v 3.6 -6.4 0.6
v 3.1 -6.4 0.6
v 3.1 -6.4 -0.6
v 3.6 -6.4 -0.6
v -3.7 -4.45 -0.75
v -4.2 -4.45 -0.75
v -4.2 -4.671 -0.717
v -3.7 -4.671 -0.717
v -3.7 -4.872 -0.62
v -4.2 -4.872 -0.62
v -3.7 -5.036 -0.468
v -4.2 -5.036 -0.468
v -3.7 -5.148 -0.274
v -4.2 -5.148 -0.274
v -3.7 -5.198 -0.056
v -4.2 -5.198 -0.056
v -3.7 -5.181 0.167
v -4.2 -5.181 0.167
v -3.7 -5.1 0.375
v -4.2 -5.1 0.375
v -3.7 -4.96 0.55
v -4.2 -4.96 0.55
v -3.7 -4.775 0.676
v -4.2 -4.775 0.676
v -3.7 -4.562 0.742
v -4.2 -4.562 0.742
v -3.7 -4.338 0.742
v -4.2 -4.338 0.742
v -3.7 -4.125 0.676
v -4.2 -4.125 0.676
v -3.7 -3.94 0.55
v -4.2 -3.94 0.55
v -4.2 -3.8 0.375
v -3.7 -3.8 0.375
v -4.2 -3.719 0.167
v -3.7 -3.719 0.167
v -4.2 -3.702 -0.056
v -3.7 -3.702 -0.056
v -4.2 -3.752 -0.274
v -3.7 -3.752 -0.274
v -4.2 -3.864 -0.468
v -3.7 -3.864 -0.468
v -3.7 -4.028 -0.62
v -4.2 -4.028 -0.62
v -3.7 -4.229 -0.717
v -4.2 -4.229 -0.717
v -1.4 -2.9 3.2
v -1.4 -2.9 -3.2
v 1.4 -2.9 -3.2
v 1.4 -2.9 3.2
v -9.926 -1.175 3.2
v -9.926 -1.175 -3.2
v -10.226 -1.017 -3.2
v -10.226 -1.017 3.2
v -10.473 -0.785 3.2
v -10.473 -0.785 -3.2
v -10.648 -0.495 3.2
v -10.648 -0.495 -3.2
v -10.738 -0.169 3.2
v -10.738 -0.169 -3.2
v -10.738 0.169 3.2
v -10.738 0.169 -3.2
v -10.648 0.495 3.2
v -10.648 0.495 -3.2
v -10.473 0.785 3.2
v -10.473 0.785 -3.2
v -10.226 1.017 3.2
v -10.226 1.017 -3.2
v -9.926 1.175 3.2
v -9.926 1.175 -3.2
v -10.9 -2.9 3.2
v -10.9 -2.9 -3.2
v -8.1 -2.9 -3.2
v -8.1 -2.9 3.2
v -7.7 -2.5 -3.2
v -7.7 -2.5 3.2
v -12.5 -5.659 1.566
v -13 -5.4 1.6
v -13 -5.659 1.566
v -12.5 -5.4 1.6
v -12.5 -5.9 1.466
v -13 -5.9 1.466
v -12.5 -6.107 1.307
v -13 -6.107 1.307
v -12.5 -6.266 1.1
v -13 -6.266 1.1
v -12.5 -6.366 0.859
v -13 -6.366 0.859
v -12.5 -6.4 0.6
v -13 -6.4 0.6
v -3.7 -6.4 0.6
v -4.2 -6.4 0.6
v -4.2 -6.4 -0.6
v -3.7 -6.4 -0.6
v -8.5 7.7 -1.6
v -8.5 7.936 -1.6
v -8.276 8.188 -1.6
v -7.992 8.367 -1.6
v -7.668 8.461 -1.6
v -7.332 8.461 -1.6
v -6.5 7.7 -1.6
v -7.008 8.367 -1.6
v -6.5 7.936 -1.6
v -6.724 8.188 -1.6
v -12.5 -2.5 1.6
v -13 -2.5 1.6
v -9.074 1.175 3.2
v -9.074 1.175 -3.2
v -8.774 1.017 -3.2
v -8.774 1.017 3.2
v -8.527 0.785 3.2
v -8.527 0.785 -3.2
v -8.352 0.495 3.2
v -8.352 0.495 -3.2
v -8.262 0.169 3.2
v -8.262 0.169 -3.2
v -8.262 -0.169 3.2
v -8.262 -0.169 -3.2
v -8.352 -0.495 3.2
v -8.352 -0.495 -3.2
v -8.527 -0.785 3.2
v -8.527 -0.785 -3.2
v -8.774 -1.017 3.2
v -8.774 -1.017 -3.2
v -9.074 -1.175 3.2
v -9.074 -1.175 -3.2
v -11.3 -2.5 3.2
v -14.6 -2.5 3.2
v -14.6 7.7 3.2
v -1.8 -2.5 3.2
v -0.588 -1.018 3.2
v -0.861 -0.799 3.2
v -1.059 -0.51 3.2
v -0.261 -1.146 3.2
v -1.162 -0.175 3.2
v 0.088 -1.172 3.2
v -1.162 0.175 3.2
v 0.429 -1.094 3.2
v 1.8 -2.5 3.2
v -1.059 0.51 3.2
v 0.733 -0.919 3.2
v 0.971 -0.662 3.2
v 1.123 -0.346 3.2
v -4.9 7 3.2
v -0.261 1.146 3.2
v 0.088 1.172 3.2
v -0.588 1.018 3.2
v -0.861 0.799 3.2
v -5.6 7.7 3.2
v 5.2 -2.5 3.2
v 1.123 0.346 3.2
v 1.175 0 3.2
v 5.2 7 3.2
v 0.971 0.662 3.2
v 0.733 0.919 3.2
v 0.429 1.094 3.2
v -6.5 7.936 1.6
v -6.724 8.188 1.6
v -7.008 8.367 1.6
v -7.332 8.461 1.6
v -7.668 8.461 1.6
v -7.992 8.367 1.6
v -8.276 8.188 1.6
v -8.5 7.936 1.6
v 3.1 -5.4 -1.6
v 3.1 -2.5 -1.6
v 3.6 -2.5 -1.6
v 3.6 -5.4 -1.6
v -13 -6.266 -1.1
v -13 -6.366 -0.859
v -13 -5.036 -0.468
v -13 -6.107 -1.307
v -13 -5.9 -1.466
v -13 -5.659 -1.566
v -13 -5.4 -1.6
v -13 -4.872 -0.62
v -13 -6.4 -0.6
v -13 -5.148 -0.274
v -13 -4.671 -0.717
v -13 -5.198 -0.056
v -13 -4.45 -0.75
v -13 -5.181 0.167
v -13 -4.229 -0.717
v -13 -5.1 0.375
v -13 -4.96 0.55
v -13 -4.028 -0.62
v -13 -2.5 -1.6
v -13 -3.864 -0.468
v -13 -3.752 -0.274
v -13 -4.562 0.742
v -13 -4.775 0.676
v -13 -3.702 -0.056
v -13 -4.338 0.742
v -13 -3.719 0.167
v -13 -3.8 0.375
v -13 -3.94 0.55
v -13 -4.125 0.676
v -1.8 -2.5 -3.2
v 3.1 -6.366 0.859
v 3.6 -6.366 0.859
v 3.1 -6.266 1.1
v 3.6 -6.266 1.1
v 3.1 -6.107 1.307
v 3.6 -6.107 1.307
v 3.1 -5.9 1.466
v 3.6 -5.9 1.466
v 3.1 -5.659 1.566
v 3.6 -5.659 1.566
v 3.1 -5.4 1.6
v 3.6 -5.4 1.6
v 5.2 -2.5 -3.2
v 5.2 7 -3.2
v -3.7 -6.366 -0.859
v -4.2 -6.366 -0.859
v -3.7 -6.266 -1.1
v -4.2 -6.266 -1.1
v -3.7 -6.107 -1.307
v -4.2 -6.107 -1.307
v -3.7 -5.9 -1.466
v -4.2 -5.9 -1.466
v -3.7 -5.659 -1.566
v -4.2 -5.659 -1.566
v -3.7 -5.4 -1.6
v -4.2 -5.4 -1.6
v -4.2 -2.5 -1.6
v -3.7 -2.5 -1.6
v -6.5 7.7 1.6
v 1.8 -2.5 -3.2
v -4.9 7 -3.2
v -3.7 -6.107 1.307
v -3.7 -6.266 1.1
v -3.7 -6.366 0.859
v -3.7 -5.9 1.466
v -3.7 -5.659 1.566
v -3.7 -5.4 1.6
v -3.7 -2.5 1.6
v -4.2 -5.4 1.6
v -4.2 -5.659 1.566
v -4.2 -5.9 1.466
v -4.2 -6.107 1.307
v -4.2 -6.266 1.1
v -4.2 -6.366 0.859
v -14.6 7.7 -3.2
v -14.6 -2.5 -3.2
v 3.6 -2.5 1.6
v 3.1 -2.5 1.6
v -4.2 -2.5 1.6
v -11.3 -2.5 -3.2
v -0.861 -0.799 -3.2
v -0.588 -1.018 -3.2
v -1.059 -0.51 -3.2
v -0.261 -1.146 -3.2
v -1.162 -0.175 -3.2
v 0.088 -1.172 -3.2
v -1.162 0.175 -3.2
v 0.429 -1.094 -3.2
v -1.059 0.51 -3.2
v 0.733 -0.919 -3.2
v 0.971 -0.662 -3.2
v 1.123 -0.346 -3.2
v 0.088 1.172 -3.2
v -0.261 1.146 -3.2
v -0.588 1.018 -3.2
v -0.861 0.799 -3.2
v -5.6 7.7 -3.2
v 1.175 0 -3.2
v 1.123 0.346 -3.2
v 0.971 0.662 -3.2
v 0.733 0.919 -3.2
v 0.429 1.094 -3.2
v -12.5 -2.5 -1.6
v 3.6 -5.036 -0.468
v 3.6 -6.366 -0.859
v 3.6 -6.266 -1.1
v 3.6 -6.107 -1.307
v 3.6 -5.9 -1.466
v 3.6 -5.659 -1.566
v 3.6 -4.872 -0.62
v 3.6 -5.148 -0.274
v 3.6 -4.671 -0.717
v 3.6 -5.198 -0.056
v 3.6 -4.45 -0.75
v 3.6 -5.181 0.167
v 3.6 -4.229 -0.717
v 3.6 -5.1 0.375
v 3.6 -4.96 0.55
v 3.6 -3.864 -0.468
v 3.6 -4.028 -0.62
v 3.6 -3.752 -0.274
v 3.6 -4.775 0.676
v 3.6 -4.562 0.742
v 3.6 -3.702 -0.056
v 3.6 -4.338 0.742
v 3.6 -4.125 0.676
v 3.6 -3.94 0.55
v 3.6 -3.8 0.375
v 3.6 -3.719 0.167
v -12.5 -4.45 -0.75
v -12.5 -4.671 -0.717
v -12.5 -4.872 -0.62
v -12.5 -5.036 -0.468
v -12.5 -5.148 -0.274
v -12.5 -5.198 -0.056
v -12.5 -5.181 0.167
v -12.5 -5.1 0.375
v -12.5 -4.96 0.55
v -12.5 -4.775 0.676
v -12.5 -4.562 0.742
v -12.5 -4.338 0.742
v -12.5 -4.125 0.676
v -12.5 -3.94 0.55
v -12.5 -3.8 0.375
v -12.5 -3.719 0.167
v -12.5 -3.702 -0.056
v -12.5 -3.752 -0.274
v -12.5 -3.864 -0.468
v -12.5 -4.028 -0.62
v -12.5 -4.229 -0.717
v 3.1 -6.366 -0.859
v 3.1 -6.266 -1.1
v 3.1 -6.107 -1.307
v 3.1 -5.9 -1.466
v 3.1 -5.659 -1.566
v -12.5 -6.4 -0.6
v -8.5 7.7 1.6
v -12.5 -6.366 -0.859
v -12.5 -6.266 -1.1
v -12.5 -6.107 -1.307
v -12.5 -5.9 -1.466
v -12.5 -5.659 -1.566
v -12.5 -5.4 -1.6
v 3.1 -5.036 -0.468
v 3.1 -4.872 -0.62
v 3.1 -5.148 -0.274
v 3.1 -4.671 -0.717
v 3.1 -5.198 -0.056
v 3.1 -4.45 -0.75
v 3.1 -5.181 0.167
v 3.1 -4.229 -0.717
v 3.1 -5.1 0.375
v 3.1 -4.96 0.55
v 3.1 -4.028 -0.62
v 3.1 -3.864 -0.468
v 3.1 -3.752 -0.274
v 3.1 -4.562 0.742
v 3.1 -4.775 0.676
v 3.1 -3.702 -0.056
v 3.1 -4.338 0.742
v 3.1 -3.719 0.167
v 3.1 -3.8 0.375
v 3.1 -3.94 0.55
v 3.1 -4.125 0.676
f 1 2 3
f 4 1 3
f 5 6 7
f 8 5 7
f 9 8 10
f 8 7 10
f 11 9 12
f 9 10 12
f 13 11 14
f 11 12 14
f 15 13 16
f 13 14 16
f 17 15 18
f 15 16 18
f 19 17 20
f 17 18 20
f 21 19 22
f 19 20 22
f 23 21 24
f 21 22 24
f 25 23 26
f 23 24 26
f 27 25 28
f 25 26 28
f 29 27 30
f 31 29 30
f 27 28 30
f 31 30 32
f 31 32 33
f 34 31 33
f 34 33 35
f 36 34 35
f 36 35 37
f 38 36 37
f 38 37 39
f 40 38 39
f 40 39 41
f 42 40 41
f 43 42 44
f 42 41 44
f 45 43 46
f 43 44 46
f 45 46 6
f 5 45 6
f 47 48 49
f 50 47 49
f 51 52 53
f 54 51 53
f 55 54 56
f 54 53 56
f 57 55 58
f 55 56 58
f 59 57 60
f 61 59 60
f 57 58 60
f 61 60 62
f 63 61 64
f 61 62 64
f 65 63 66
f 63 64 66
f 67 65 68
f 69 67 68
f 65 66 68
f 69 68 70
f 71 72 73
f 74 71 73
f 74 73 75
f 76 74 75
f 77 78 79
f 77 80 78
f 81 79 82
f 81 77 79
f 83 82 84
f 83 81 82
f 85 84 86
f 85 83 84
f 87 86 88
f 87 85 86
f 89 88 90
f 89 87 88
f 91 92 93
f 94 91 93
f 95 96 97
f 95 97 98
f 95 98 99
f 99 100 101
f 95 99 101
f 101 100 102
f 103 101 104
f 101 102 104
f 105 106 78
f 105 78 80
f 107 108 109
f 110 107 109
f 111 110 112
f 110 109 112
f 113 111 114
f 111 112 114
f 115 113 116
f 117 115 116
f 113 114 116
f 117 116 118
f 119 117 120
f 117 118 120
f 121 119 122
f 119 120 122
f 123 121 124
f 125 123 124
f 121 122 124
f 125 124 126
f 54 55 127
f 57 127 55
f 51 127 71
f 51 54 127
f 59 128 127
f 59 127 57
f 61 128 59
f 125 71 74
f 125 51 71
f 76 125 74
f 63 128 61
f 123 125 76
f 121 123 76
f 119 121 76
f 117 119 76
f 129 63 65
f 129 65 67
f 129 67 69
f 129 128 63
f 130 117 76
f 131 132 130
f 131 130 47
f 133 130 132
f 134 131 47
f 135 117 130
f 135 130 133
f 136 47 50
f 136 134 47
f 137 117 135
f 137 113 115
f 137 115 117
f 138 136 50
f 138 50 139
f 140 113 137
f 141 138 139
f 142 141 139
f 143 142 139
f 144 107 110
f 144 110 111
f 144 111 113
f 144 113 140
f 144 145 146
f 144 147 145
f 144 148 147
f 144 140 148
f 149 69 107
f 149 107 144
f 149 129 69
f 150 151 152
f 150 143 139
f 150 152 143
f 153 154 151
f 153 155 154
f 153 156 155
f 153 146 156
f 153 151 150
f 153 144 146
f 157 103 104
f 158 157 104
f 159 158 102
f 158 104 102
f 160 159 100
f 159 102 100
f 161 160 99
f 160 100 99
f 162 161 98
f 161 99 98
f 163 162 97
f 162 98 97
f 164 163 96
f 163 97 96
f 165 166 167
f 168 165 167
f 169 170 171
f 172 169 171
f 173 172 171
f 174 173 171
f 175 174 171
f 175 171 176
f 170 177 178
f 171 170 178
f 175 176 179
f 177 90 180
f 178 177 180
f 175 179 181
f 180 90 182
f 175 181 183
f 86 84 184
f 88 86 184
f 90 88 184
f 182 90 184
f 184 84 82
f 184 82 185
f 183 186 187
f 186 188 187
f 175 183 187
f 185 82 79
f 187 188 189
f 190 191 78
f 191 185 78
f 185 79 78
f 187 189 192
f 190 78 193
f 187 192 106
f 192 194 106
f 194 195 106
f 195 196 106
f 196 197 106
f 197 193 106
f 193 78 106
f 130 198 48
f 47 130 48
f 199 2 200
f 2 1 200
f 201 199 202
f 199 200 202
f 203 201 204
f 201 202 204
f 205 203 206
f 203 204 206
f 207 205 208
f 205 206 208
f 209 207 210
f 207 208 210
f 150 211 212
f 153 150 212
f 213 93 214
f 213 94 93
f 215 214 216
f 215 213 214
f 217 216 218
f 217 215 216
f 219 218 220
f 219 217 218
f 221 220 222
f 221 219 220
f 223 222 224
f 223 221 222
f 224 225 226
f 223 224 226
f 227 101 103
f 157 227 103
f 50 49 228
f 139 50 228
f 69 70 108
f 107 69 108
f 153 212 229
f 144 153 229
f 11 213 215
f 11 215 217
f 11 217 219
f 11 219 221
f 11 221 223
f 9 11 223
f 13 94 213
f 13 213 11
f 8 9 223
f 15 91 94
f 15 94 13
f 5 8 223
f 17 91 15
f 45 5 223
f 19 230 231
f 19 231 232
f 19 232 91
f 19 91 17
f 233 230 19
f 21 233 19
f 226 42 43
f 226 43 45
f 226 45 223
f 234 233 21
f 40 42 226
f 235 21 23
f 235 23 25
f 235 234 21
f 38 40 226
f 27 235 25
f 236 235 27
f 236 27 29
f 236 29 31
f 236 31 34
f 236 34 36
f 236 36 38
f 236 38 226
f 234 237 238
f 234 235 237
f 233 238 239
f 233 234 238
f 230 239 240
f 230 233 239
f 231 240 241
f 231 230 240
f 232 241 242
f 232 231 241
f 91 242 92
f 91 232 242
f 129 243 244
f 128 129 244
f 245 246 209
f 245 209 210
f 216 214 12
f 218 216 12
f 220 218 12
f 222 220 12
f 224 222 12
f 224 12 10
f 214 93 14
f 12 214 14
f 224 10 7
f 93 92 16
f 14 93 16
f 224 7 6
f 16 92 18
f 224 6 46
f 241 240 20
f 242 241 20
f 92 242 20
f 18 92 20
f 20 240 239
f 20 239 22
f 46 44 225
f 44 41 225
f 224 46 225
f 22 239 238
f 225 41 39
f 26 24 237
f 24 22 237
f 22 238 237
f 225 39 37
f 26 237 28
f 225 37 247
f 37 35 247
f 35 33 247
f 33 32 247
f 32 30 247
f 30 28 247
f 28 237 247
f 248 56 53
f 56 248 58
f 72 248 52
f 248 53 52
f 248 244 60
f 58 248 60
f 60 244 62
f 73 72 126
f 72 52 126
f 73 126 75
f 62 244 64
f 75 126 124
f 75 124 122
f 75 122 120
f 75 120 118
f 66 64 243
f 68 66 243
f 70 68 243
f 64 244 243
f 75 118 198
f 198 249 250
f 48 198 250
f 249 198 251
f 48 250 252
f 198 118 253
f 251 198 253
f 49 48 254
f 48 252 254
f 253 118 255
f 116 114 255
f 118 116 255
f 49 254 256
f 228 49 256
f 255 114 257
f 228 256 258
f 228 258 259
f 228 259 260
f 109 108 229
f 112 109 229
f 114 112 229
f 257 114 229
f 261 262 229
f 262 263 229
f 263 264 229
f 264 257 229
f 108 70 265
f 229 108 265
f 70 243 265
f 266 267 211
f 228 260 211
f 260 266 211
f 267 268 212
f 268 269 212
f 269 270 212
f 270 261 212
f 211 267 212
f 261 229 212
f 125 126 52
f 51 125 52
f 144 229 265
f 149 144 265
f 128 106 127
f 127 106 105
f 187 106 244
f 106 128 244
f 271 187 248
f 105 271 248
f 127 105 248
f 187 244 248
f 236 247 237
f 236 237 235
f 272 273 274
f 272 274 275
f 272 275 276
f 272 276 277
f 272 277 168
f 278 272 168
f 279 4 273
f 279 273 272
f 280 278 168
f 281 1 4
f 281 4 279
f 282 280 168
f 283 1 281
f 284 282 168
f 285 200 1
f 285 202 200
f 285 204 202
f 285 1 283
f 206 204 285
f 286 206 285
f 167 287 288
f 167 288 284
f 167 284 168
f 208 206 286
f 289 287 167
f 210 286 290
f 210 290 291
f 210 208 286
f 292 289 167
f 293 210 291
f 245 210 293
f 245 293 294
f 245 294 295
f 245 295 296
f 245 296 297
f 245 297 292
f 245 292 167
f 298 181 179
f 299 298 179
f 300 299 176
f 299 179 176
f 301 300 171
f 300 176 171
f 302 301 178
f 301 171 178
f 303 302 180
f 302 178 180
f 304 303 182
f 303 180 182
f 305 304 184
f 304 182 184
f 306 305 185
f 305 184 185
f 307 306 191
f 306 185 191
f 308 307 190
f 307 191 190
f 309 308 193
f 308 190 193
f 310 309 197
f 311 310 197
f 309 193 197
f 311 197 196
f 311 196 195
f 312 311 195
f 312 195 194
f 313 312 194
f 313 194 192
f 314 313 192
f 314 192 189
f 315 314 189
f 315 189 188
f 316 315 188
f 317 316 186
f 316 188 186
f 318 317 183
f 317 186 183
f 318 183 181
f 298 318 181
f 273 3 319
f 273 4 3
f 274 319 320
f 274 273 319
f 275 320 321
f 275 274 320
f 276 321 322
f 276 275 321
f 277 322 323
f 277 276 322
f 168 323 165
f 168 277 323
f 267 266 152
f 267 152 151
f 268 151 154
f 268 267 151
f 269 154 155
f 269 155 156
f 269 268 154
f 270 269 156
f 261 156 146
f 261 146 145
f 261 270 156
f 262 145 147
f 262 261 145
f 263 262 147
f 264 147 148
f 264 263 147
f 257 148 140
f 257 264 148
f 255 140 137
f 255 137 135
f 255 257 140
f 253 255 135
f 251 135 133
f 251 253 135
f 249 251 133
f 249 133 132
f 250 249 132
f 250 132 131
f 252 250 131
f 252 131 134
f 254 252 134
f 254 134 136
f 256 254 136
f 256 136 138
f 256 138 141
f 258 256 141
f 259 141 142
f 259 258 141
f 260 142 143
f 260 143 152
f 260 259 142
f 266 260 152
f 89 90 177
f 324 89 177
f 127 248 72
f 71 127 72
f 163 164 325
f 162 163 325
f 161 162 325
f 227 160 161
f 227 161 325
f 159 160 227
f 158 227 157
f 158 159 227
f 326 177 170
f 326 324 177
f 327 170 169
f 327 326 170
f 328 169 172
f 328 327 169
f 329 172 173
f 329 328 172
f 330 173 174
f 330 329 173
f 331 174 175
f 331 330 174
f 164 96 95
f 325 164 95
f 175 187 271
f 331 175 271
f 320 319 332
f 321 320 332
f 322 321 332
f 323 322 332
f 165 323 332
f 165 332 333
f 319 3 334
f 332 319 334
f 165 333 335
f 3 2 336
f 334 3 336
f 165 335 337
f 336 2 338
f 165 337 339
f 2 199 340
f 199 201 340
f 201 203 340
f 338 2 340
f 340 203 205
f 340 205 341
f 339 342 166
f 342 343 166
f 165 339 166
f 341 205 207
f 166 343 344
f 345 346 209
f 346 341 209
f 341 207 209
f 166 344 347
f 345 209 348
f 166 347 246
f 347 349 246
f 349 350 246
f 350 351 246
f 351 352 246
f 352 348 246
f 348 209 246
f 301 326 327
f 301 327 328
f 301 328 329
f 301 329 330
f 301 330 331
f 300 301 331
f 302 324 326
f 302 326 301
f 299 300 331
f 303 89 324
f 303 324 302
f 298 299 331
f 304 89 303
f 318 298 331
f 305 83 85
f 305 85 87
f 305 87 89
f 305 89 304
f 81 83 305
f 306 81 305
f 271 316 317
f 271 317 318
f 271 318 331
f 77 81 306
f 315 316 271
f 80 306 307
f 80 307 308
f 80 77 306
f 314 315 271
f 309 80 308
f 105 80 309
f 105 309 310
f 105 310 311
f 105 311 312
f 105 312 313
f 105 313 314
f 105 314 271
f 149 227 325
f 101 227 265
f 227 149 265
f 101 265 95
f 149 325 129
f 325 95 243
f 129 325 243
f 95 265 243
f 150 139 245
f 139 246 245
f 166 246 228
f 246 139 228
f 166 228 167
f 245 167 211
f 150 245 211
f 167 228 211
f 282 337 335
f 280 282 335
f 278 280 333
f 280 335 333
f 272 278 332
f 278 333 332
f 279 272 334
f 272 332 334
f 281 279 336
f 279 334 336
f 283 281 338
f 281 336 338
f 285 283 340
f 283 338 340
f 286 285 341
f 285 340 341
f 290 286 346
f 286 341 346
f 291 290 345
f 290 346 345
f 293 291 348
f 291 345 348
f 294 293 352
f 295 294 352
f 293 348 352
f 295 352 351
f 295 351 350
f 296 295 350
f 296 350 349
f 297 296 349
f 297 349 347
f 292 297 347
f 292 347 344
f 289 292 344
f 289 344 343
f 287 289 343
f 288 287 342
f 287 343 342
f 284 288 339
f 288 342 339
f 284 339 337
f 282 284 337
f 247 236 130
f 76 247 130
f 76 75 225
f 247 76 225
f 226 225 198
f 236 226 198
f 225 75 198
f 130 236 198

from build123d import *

# Parameters (mm, degrees)
CUT_EXTRUDE1_START       = -3.2
CUT_EXTRUDE1_OUTLINE_R   = 1.175
CUT_EXTRUDE1_DEPTH       = 6.4
CUT_EXTRUDE1_START_2     = -1.6
CUT_EXTRUDE1_2_OUTLINE_W = 0.5
CUT_EXTRUDE1_2_OUTLINE_H = 3.9
CUT_EXTRUDE1_2_DEPTH     = 0.8499999
CUT_EXTRUDE1_START_3     = 0.7500001
CUT_EXTRUDE1_3_OUTLINE_W = 0.5
CUT_EXTRUDE1_3_OUTLINE_H = 3.9
CUT_EXTRUDE1_3_DEPTH     = 0.8499999
CUT_EXTRUDE1_4_DEPTH     = 3.2
CUT_EXTRUDE1_START_4     = -13
CUT_EXTRUDE1_5_DEPTH     = 0.5
CUT_EXTRUDE1_START_5     = -4.2
CUT_EXTRUDE1_6_DEPTH     = 0.5
CUT_EXTRUDE1_START_6     = 3.1
CUT_EXTRUDE1_7_DEPTH     = 0.5
FILLET1_R                = 1


with BuildPart() as part:
    # Cut-Extrude1: read off the stored shape, not the designer's step
    # Cut-Extrude1 outline → Cut-Extrude1 (new body)
    with BuildSketch(Plane.XY.offset(CUT_EXTRUDE1_START)):
        Polygon((-14.6, -2.5), (-11.3, -2.5), (-10.9, -2.9), (-8.1, -2.9), (-7.7, -2.5), (-1.8, -2.5), (-1.4, -2.9), (1.4, -2.9), (1.8, -2.5), (5.2, -2.5), (5.2, 7), (-4.9, 7), (-5.6, 7.7), (-14.6, 7.7), align=None)
        with BuildLine():
            ThreePointArc((-9.926468053, -1.175), (-10.75, 0), (-9.926468053, 1.175))
            Line((-9.926468053, 1.175), (-9.073531947, 1.175))
            ThreePointArc((-9.073531947, 1.175), (-8.25, 0), (-9.073531947, -1.175))
            Line((-9.073531947, -1.175), (-9.926468053, -1.175))
        make_face(mode=Mode.SUBTRACT)
        Circle(CUT_EXTRUDE1_OUTLINE_R, mode=Mode.SUBTRACT)
    extrude(amount=CUT_EXTRUDE1_DEPTH)

    # Cut-Extrude1 2 outline → Cut-Extrude1 2 (add)
    with BuildSketch(Plane.XY.offset(CUT_EXTRUDE1_START_2)):
        with Locations((-12.75, -4.45)):
            Rectangle(CUT_EXTRUDE1_2_OUTLINE_W, CUT_EXTRUDE1_2_OUTLINE_H)
        with Locations((-3.95, -4.45)):
            Rectangle(CUT_EXTRUDE1_2_OUTLINE_W, CUT_EXTRUDE1_2_OUTLINE_H)
        with BuildLine():
            Line((-8.5, 7.936178156), (-8.5, 7.7))
            Line((-8.5, 7.7), (-6.5, 7.7))
            Line((-6.5, 7.7), (-6.5, 7.936178156))
            ThreePointArc((-6.5, 7.936178156), (-7.5, 8.472853198), (-8.5, 7.936178156))
        make_face()
        with Locations((3.35, -4.45)):
            Rectangle(CUT_EXTRUDE1_2_OUTLINE_W, CUT_EXTRUDE1_2_OUTLINE_H)
    extrude(amount=CUT_EXTRUDE1_2_DEPTH)

    # Cut-Extrude1 3 outline → Cut-Extrude1 3 (add)
    with BuildSketch(Plane.XY.offset(CUT_EXTRUDE1_START_3)):
        with Locations((-12.75, -4.45)):
            Rectangle(CUT_EXTRUDE1_3_OUTLINE_W, CUT_EXTRUDE1_3_OUTLINE_H)
        with Locations((-3.95, -4.45)):
            Rectangle(CUT_EXTRUDE1_3_OUTLINE_W, CUT_EXTRUDE1_3_OUTLINE_H)
        with BuildLine():
            Line((-8.5, 7.936178156), (-8.5, 7.7))
            Line((-8.5, 7.7), (-6.5, 7.7))
            Line((-6.5, 7.7), (-6.5, 7.936178156))
            ThreePointArc((-6.5, 7.936178156), (-7.5, 8.472853198), (-8.5, 7.936178156))
        make_face()
        with Locations((3.35, -4.45)):
            Rectangle(CUT_EXTRUDE1_3_OUTLINE_W, CUT_EXTRUDE1_3_OUTLINE_H)
    extrude(amount=CUT_EXTRUDE1_3_DEPTH)

    # Cut-Extrude1 4 outline → Cut-Extrude1 4 (add)
    with BuildSketch(Plane.XY.offset(CUT_EXTRUDE1_START_2)):
        with BuildLine():
            Line((-8.5, 7.936178156), (-8.5, 7.7))
            Line((-8.5, 7.7), (-6.5, 7.7))
            Line((-6.5, 7.7), (-6.5, 7.936178156))
            ThreePointArc((-6.5, 7.936178156), (-7.5, 8.472853198), (-8.5, 7.936178156))
        make_face()
    extrude(amount=CUT_EXTRUDE1_4_DEPTH)

    # Cut-Extrude1 5 outline → Cut-Extrude1 5 (add)
    with BuildSketch(Plane.YZ.offset(CUT_EXTRUDE1_START_4)):
        with BuildLine():
            Line((-4.45, 0.75), (-6.4, 0.7500001))
            Line((-6.4, 0.7500001), (-6.4, -0.7500001))
            Line((-6.4, -0.7500001), (-4.45, -0.75))
            ThreePointArc((-4.45, -0.75), (-5.2, 0), (-4.45, 0.75))
        make_face()
        with BuildLine():
            Line((-2.5, 0.7500001), (-4.45, 0.75))
            ThreePointArc((-4.45, 0.75), (-3.7, 0), (-4.45, -0.75))
            Line((-4.45, -0.75), (-2.5, -0.7500001))
            Line((-2.5, -0.7500001), (-2.5, 0.7500001))
        make_face()
    extrude(amount=CUT_EXTRUDE1_5_DEPTH)

    # Cut-Extrude1 6 outline → Cut-Extrude1 6 (add)
    with BuildSketch(Plane.YZ.offset(CUT_EXTRUDE1_START_5)):
        with BuildLine():
            Line((-4.45, 0.75), (-6.4, 0.7500001))
            Line((-6.4, 0.7500001), (-6.4, -0.7500001))
            Line((-6.4, -0.7500001), (-4.45, -0.75))
            ThreePointArc((-4.45, -0.75), (-5.2, 0), (-4.45, 0.75))
        make_face()
        with BuildLine():
            Line((-2.5, 0.7500001), (-4.45, 0.75))
            ThreePointArc((-4.45, 0.75), (-3.7, 0), (-4.45, -0.75))
            Line((-4.45, -0.75), (-2.5, -0.7500001))
            Line((-2.5, -0.7500001), (-2.5, 0.7500001))
        make_face()
    extrude(amount=CUT_EXTRUDE1_6_DEPTH)

    # Cut-Extrude1 7 outline → Cut-Extrude1 7 (add)
    with BuildSketch(Plane.YZ.offset(CUT_EXTRUDE1_START_6)):
        with BuildLine():
            Line((-4.45, 0.75), (-6.4, 0.7500001))
            Line((-6.4, 0.7500001), (-6.4, -0.7500001))
            Line((-6.4, -0.7500001), (-4.45, -0.75))
            ThreePointArc((-4.45, -0.75), (-5.2, 0), (-4.45, 0.75))
        make_face()
        with BuildLine():
            Line((-2.5, 0.7500001), (-4.45, 0.75))
            ThreePointArc((-4.45, 0.75), (-3.7, 0), (-4.45, -0.75))
            Line((-4.45, -0.75), (-2.5, -0.7500001))
            Line((-2.5, -0.7500001), (-2.5, 0.7500001))
        make_face()
    extrude(amount=CUT_EXTRUDE1_7_DEPTH)

    # Fillet1
    fillet1_edges = [part.edges().sort_by_distance(p)[0] for p in [
        (-12.75, -6.4, 1.6),
        (-12.75, -6.4, -1.6),
        (-3.95, -6.4, -1.6),
        (-3.95, -6.4, 1.6),
        (3.35, -6.4, -1.6),
        (3.35, -6.4, 1.6),
    ]]
    fillet(fillet1_edges, radius=FILLET1_R)


solid = part.part
